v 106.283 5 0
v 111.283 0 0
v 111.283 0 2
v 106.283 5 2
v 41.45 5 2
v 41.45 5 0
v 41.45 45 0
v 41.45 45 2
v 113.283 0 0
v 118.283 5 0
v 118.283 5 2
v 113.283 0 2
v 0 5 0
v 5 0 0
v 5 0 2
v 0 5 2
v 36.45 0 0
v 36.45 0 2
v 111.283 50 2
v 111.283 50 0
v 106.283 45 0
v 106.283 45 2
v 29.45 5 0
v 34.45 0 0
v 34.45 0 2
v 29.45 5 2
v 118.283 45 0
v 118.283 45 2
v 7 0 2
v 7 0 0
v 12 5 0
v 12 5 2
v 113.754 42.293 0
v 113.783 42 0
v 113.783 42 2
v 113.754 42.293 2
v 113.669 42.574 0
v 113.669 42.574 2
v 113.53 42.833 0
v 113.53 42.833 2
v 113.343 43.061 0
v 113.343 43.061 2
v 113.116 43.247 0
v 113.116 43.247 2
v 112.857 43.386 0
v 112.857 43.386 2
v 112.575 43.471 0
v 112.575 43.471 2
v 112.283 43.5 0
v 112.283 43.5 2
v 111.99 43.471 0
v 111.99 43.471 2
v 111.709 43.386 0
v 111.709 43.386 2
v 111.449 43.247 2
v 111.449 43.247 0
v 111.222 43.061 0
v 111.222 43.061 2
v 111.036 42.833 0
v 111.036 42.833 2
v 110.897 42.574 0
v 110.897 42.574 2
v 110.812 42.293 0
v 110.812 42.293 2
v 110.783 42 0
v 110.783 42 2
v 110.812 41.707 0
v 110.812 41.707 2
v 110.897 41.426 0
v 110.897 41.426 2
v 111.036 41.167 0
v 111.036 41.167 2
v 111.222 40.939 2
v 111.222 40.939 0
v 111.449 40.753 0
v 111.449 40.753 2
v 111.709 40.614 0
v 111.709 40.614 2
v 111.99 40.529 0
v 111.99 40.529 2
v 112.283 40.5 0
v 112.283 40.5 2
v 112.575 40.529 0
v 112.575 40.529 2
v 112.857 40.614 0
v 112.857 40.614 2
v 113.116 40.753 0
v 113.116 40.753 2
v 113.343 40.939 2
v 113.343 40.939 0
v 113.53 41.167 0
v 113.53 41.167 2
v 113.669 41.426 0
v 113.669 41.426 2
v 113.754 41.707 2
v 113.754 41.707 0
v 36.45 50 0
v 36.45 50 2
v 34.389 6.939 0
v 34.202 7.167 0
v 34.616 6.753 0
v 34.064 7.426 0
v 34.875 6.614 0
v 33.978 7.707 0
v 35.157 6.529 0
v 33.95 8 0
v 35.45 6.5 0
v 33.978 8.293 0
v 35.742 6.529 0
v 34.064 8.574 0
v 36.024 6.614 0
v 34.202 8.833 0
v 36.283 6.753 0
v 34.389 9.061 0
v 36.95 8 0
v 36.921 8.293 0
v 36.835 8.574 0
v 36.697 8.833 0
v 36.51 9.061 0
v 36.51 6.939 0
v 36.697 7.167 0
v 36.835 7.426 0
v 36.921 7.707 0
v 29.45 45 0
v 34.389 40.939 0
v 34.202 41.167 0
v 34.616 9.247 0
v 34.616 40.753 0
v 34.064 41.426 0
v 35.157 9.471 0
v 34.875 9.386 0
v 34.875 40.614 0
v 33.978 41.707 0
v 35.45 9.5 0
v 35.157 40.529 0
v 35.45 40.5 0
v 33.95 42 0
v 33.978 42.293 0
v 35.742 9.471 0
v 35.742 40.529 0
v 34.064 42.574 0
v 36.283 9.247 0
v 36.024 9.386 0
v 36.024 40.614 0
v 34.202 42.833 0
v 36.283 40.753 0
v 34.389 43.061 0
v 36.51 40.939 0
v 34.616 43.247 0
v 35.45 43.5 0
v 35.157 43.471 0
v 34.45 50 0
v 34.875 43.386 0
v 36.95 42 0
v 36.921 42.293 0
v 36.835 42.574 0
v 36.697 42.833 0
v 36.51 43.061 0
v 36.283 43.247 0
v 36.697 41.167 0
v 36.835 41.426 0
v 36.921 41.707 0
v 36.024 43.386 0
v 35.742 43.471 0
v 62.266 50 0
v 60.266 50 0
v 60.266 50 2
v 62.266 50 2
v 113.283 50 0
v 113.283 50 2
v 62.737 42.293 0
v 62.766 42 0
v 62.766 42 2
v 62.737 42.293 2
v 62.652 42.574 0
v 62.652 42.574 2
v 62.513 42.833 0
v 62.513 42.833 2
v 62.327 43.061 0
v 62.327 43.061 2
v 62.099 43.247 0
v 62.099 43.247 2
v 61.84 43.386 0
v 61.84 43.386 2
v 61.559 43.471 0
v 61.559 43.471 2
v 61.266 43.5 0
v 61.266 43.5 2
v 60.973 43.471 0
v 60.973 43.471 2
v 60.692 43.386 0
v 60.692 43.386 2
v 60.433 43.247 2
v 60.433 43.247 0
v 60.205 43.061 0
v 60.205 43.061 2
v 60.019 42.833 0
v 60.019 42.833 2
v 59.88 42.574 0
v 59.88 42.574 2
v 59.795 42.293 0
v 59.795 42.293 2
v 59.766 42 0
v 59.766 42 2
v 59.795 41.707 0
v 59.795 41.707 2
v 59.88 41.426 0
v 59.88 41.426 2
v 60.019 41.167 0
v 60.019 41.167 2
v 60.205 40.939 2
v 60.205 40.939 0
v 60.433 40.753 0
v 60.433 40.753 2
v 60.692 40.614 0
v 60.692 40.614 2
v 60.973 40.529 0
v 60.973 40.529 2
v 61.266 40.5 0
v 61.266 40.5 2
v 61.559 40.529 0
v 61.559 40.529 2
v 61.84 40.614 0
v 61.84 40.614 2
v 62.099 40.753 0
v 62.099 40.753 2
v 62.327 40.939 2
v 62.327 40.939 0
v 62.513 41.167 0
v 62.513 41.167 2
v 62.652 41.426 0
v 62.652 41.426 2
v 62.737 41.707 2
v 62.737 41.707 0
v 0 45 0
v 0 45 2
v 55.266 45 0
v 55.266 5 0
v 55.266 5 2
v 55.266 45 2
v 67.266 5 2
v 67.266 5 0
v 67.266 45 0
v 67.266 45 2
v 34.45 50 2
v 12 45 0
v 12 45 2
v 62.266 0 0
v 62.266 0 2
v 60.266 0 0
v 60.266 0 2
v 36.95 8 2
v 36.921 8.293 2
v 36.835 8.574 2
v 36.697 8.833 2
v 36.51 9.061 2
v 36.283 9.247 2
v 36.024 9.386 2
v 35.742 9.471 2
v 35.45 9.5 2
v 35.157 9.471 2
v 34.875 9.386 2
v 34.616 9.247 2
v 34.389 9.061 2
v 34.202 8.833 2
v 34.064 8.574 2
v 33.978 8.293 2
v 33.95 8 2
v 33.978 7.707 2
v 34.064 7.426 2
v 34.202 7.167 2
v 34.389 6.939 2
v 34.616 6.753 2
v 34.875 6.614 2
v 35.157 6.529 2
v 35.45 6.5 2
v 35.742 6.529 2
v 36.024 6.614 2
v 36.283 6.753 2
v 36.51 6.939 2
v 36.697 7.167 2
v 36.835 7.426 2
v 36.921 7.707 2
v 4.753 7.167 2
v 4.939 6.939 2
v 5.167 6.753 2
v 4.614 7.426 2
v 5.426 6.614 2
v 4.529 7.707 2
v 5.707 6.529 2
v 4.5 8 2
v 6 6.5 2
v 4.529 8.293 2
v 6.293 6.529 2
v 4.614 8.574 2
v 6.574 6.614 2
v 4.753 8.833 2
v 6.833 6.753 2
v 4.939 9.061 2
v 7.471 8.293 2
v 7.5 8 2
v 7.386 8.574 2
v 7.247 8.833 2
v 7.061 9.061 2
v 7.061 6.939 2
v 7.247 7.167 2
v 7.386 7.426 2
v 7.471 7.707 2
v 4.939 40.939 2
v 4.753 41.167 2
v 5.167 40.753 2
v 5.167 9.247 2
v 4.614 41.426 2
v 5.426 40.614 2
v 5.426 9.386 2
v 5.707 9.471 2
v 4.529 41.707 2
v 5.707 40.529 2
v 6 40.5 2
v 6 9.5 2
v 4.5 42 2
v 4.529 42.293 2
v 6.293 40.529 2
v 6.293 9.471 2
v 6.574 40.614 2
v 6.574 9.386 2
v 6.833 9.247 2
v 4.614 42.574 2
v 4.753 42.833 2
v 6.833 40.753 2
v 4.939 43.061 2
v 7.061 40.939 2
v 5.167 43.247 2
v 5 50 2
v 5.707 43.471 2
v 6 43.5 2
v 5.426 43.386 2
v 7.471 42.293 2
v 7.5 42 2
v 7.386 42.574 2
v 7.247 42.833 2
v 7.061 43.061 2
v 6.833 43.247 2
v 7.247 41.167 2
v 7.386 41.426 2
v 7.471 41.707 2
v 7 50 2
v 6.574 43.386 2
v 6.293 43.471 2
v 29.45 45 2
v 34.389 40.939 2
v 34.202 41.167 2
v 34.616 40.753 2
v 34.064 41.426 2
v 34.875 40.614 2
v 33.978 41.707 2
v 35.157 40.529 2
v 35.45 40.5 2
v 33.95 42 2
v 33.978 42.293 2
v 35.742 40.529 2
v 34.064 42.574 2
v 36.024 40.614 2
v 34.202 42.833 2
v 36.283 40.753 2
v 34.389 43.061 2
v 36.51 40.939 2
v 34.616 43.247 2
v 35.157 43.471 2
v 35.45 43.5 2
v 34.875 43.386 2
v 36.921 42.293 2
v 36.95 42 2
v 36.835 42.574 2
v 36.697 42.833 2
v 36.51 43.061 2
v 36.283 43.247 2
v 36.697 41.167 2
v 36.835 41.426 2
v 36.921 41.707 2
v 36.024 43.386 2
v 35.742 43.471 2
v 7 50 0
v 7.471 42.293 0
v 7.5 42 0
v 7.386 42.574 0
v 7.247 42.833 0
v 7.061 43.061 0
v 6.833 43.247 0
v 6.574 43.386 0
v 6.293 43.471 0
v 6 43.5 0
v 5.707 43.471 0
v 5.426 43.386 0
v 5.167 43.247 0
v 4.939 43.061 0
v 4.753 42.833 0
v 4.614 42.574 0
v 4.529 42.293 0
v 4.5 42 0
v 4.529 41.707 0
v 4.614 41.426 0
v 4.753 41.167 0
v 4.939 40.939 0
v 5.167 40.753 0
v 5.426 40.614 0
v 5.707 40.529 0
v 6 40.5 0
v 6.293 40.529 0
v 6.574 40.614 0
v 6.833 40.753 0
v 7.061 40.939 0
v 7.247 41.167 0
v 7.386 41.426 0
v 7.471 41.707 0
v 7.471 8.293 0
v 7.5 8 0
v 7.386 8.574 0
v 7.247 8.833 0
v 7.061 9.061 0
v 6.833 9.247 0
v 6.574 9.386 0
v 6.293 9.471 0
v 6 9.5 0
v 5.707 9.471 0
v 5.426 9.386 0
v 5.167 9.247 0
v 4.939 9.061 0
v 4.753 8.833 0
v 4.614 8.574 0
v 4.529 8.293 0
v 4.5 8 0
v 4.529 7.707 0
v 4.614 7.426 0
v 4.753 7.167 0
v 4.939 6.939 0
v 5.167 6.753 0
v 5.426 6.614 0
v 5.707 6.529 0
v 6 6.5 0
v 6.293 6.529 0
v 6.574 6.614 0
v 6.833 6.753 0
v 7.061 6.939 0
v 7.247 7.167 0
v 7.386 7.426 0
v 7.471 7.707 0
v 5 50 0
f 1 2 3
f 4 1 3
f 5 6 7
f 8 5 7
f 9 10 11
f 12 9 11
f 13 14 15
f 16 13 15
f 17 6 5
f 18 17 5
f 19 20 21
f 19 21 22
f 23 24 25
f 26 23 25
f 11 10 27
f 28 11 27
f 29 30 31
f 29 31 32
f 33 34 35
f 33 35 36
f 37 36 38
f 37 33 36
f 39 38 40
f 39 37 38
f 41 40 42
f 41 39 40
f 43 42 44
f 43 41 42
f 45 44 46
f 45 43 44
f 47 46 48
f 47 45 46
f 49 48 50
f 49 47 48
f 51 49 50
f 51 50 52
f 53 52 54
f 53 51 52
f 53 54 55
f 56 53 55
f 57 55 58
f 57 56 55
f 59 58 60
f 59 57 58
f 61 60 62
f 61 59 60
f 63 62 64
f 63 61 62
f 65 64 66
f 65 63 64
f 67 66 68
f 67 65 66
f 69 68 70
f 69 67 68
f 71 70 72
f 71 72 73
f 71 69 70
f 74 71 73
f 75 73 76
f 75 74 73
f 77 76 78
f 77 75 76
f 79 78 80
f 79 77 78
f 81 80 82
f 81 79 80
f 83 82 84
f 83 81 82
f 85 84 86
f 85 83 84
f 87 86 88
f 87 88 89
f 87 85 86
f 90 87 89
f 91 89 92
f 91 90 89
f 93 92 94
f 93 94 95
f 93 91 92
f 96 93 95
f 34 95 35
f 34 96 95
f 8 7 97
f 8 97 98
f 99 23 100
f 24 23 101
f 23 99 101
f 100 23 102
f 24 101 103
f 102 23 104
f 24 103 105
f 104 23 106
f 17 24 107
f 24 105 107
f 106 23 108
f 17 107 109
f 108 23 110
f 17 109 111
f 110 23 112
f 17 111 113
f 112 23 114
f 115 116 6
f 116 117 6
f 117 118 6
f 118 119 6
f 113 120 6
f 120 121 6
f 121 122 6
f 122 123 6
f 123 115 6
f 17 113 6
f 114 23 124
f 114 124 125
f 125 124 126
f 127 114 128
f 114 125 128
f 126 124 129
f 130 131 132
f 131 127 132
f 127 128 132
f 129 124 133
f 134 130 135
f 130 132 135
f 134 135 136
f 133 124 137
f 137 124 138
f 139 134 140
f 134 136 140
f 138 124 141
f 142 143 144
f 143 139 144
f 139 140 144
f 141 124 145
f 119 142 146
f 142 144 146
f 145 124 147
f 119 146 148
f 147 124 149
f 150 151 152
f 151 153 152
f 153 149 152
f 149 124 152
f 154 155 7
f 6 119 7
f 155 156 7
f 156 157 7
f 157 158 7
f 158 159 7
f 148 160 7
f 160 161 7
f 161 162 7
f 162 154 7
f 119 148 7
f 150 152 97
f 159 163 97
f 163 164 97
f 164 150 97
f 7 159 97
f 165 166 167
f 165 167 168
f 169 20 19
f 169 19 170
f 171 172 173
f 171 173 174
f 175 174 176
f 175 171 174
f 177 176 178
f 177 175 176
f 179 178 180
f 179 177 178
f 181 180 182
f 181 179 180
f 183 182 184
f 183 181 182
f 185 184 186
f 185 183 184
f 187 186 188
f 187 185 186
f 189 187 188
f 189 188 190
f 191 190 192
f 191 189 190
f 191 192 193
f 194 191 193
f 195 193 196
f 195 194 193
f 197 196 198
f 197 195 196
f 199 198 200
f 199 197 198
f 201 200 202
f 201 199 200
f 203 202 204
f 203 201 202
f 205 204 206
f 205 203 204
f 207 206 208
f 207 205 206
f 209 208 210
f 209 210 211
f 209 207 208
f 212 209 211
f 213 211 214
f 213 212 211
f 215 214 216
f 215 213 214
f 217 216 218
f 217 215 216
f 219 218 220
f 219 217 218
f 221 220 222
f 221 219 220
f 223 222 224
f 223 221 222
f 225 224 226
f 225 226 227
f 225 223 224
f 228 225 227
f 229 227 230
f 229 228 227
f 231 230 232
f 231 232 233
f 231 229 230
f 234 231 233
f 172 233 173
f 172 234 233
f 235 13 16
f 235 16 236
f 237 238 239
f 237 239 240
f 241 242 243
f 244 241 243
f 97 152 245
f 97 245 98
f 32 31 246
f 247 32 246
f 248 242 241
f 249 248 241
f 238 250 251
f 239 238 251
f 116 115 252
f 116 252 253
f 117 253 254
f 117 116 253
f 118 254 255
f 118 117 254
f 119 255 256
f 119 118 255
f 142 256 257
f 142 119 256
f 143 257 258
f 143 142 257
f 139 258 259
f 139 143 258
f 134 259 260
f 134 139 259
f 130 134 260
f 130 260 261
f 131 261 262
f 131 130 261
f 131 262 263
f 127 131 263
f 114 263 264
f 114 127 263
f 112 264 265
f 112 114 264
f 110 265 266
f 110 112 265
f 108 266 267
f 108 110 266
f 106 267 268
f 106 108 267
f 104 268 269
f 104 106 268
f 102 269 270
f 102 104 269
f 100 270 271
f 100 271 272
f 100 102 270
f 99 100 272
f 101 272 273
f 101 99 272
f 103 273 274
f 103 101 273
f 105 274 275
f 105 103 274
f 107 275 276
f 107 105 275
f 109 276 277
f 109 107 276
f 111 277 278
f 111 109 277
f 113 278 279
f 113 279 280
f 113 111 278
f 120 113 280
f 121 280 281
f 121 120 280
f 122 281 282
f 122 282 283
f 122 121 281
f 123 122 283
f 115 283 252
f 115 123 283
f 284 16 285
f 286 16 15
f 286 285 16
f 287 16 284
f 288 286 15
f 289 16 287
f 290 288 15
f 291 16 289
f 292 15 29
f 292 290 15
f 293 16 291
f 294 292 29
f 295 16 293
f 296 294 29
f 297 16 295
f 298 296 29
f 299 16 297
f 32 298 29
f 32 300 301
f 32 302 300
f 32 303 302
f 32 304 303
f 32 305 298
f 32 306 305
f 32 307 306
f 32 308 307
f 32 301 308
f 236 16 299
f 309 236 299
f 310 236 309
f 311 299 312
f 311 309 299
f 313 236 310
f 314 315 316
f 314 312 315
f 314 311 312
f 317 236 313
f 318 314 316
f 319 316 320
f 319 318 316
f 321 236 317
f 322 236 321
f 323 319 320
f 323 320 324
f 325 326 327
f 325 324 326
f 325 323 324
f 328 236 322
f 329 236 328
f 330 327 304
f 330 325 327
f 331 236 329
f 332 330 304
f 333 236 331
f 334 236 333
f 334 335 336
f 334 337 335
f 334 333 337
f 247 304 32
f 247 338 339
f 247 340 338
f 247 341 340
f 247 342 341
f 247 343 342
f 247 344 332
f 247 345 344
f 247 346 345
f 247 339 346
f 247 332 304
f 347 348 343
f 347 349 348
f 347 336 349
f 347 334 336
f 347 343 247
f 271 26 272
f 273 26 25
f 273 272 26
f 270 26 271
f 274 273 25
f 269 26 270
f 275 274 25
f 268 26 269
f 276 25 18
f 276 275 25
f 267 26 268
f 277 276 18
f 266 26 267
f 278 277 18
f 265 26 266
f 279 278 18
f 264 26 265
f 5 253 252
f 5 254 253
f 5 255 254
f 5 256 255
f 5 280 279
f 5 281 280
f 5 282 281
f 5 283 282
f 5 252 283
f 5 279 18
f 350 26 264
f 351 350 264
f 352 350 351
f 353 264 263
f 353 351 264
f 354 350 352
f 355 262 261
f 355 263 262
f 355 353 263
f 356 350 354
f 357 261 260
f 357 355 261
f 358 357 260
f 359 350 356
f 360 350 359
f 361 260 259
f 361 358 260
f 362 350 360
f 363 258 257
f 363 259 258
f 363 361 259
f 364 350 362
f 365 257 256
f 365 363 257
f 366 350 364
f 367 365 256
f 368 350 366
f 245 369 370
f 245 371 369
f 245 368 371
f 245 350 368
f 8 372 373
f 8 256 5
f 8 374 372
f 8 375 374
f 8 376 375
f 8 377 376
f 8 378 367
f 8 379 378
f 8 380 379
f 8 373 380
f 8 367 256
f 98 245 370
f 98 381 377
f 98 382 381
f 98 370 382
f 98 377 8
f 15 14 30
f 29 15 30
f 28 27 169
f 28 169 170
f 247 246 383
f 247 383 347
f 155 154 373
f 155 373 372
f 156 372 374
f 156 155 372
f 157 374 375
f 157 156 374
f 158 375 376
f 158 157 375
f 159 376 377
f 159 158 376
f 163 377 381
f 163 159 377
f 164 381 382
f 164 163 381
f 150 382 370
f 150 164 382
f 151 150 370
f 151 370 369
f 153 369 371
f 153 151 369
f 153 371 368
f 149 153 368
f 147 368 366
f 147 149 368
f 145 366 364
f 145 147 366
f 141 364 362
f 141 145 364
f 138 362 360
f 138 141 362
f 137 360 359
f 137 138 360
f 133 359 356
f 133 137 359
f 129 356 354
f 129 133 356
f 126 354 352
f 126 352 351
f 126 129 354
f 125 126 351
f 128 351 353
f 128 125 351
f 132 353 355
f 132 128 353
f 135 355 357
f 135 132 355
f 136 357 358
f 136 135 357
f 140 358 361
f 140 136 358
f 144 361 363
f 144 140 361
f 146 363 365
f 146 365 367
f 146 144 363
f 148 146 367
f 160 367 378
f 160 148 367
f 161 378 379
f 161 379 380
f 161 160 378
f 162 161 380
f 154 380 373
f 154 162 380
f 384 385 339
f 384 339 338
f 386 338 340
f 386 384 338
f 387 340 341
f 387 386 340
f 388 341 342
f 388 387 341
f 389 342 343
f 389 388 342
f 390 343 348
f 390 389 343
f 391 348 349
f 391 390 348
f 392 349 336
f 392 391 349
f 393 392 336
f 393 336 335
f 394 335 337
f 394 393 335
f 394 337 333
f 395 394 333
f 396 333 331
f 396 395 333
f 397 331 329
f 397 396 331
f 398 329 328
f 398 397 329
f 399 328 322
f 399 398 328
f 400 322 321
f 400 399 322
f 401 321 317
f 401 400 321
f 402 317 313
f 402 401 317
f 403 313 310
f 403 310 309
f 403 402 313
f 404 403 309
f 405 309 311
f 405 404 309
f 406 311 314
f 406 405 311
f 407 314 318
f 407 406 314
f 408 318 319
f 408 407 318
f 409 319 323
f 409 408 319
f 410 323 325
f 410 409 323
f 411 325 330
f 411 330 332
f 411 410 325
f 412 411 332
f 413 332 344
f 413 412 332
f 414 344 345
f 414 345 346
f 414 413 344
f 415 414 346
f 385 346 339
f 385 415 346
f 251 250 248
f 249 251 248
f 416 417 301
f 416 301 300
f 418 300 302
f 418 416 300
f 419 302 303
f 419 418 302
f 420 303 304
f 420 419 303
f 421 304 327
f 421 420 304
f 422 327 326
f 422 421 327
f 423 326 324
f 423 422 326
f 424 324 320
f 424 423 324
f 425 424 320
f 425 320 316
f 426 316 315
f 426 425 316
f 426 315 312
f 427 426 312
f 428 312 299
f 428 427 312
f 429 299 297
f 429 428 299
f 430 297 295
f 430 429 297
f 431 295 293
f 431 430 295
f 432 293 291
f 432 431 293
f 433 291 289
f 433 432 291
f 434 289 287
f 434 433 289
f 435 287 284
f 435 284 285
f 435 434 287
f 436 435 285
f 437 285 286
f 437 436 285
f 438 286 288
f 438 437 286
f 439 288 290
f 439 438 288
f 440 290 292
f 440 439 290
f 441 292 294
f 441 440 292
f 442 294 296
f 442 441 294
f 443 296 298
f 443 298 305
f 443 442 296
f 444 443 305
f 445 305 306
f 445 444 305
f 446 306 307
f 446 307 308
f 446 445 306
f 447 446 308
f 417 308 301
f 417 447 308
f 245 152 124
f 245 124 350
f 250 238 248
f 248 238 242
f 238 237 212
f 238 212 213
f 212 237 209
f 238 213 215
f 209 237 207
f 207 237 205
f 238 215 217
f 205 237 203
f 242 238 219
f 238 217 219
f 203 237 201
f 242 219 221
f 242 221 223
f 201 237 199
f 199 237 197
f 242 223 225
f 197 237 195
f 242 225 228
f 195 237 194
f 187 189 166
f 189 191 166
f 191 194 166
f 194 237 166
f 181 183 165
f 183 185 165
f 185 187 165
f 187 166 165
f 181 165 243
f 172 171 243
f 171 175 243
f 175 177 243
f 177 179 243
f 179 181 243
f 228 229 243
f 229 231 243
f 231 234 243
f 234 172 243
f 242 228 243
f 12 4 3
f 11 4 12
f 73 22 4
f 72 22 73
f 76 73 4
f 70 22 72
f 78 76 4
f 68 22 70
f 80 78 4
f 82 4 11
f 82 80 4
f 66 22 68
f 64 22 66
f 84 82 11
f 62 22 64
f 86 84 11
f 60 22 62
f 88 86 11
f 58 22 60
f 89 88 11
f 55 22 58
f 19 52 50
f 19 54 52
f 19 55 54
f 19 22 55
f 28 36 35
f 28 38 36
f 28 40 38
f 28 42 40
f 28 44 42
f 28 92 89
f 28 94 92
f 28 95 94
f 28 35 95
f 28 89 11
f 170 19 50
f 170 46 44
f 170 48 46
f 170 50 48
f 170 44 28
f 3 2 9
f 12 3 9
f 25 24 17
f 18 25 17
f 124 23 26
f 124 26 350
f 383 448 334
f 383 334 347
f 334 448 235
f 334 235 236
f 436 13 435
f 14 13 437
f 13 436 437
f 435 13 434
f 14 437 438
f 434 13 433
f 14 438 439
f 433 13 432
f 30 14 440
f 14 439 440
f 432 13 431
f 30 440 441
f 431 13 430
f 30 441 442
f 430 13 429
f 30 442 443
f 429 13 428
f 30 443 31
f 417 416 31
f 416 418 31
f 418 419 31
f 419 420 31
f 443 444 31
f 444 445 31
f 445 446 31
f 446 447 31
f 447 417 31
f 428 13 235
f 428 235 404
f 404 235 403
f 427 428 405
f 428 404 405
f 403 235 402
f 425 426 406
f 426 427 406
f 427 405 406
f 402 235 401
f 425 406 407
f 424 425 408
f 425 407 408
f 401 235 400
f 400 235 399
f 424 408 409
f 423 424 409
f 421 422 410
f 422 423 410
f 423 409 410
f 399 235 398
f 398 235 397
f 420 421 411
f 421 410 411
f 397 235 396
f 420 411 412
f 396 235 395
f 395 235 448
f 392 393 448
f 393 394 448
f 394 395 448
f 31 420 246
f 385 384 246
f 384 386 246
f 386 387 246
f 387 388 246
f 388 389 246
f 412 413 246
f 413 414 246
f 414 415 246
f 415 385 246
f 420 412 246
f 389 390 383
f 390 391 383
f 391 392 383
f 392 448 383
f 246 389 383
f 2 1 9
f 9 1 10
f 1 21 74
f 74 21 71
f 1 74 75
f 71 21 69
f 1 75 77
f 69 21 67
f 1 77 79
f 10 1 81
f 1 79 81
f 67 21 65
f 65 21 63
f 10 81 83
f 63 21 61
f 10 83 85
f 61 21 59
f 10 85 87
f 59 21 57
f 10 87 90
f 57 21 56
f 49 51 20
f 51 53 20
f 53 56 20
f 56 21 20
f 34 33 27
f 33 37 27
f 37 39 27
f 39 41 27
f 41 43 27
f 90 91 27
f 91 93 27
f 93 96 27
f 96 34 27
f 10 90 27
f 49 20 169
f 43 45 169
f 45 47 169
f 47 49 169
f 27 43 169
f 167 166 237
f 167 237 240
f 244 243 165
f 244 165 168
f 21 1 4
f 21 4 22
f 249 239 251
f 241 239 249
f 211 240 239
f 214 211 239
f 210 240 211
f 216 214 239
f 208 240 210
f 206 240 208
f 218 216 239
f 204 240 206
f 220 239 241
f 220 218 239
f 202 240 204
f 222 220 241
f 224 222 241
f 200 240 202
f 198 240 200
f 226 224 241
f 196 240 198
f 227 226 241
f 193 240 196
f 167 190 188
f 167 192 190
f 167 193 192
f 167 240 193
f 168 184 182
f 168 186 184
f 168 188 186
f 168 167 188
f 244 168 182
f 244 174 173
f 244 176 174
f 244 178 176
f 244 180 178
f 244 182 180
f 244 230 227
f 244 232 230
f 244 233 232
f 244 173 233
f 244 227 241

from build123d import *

# Parameters (mm, degrees)
F0_W     = 12
F0_H     = 50
F0_R     = 1.5
F1_DEPTH = 2
F2_SIZE  = 5


with BuildPart() as f1:
    # F0 (on Top) → F1 (new body)
    with BuildSketch(Plane.XY):
        with Locations((35.449521, 25)):
            Rectangle(F0_W, F0_H)
        with Locations((35.449521, 8)):
            Circle(F0_R, mode=Mode.SUBTRACT)
        with Locations((35.449521, 42)):
            Circle(F0_R, mode=Mode.SUBTRACT)
        with Locations((61.266034, 25)):
            Rectangle(F0_W, F0_H)
        with Locations((61.266034, 42)):
            Circle(F0_R, mode=Mode.SUBTRACT)
        with Locations((112.282799, 25)):
            Rectangle(F0_W, F0_H)
        with Locations((112.282799, 42)):
            Circle(F0_R, mode=Mode.SUBTRACT)
        with Locations((6, 25)):
            Rectangle(F0_W, F0_H)
        with Locations((6, 8)):
            Circle(F0_R, mode=Mode.SUBTRACT)
        with Locations((6, 42)):
            Circle(F0_R, mode=Mode.SUBTRACT)
    extrude(amount=F1_DEPTH)

    # F2
    f2_edges = [f1.edges().sort_by_distance(p)[0] for p in [
        (118.282799, 0, 1),
        (67.266034, 0, 1),
        (41.449521, 0, 1),
        (12, 0, 1),
        (0, 0, 1),
        (29.449521, 0, 1),
        (55.266034, 0, 1),
        (106.282799, 0, 1),
        (118.282799, 50, 1),
        (67.266034, 50, 1),
        (41.449521, 50, 1),
        (12, 50, 1),
        (106.282799, 50, 1),
        (55.266034, 50, 1),
        (29.449521, 50, 1),
        (0, 50, 1),
    ]]
    chamfer(f2_edges, length=F2_SIZE)


solid = f1.part
